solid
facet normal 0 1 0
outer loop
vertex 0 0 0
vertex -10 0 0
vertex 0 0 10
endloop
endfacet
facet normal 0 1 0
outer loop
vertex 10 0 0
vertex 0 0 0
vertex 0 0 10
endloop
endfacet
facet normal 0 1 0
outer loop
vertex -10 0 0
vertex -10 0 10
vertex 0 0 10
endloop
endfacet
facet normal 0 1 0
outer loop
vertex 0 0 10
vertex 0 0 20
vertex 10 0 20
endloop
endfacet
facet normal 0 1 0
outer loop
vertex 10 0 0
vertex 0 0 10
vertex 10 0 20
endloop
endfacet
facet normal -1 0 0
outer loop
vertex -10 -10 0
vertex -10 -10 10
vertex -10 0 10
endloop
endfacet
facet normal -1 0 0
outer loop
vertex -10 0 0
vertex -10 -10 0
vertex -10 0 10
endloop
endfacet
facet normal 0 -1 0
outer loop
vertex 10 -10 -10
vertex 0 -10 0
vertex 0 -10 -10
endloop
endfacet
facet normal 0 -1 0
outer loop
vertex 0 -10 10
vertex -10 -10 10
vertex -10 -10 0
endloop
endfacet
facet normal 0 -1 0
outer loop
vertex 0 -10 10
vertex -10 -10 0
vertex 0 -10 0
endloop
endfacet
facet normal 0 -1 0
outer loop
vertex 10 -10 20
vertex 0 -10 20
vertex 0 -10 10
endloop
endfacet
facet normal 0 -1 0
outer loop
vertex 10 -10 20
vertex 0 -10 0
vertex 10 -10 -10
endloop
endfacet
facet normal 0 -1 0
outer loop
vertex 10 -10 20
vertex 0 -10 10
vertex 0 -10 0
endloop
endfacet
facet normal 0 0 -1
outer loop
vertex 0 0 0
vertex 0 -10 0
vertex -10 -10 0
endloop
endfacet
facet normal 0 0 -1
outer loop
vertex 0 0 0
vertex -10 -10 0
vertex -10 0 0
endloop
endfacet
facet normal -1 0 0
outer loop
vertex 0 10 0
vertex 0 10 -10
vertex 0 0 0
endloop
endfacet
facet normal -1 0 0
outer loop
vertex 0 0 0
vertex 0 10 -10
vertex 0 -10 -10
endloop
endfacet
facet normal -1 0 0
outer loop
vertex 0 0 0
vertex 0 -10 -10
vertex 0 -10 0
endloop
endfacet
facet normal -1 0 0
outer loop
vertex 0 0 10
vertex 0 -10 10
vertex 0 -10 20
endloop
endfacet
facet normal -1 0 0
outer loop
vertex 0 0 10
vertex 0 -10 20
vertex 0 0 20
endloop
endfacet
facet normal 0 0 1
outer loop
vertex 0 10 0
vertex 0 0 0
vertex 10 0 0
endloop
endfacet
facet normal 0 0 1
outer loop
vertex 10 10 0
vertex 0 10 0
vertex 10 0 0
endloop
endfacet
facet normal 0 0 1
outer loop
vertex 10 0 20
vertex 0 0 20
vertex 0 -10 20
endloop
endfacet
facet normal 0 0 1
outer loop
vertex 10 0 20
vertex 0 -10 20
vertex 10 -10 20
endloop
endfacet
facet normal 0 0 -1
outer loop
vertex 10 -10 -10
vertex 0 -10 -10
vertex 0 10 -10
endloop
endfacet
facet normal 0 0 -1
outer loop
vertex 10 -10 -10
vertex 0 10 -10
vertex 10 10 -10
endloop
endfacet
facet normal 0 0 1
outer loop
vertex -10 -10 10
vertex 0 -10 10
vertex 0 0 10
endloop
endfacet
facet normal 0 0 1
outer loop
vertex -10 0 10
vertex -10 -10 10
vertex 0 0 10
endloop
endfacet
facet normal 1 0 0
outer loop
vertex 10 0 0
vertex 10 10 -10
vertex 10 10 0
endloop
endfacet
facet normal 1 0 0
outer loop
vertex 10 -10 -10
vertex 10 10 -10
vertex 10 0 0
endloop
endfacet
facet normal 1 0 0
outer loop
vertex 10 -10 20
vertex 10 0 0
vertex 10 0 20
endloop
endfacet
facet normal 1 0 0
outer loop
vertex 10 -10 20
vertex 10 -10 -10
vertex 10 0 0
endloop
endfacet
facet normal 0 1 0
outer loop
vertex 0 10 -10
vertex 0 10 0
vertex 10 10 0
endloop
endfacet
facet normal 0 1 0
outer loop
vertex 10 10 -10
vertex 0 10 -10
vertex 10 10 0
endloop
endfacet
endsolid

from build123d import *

# Parameters (mm, degrees)
F0_W     = 10
F0_H     = 10
F1_DEPTH = 20
F2_W     = 10
F2_H     = 10
F3_DEPTH = 10
F4_W     = 10
F4_H     = 10
F5_DEPTH = 10
F6_W     = 10
F6_H     = 10
F7_DEPTH = 10
F8_W     = 10
F8_H     = 10
F9_DEPTH = 10


with BuildPart() as f1:
    # F0 (on Top) → F1 (new body)
    with BuildSketch(Plane.XY):
        with Locations((5, -5)):
            Rectangle(F0_W, F0_H)
    extrude(amount=F1_DEPTH)

    # F2 (on Right) → F3 (join)
    with BuildSketch(Plane.YZ):
        with Locations((-5, 5)):
            Rectangle(F2_W, F2_H)
    extrude(amount=F3_DEPTH)

    # F4 (on Right) → F5 (join)
    with BuildSketch(Plane.YZ):
        with Locations((-5, 5)):
            Rectangle(F4_W, F4_H)
    extrude(amount=-F5_DEPTH)

    # F6 (on face) → F7 (join)
    with BuildSketch(Plane(origin=(0, 0, 0), x_dir=(1, 0, 0), z_dir=(0, 0, -1))):
        with Locations((5, 5)):
            Rectangle(F6_W, F6_H)
    extrude(amount=F7_DEPTH)

    # F8 (on Front) → F9 (join)
    with BuildSketch(Plane.XZ):
        with Locations((5, -5)):
            Rectangle(F8_W, F8_H)
    extrude(amount=-F9_DEPTH)


solid = f1.part
